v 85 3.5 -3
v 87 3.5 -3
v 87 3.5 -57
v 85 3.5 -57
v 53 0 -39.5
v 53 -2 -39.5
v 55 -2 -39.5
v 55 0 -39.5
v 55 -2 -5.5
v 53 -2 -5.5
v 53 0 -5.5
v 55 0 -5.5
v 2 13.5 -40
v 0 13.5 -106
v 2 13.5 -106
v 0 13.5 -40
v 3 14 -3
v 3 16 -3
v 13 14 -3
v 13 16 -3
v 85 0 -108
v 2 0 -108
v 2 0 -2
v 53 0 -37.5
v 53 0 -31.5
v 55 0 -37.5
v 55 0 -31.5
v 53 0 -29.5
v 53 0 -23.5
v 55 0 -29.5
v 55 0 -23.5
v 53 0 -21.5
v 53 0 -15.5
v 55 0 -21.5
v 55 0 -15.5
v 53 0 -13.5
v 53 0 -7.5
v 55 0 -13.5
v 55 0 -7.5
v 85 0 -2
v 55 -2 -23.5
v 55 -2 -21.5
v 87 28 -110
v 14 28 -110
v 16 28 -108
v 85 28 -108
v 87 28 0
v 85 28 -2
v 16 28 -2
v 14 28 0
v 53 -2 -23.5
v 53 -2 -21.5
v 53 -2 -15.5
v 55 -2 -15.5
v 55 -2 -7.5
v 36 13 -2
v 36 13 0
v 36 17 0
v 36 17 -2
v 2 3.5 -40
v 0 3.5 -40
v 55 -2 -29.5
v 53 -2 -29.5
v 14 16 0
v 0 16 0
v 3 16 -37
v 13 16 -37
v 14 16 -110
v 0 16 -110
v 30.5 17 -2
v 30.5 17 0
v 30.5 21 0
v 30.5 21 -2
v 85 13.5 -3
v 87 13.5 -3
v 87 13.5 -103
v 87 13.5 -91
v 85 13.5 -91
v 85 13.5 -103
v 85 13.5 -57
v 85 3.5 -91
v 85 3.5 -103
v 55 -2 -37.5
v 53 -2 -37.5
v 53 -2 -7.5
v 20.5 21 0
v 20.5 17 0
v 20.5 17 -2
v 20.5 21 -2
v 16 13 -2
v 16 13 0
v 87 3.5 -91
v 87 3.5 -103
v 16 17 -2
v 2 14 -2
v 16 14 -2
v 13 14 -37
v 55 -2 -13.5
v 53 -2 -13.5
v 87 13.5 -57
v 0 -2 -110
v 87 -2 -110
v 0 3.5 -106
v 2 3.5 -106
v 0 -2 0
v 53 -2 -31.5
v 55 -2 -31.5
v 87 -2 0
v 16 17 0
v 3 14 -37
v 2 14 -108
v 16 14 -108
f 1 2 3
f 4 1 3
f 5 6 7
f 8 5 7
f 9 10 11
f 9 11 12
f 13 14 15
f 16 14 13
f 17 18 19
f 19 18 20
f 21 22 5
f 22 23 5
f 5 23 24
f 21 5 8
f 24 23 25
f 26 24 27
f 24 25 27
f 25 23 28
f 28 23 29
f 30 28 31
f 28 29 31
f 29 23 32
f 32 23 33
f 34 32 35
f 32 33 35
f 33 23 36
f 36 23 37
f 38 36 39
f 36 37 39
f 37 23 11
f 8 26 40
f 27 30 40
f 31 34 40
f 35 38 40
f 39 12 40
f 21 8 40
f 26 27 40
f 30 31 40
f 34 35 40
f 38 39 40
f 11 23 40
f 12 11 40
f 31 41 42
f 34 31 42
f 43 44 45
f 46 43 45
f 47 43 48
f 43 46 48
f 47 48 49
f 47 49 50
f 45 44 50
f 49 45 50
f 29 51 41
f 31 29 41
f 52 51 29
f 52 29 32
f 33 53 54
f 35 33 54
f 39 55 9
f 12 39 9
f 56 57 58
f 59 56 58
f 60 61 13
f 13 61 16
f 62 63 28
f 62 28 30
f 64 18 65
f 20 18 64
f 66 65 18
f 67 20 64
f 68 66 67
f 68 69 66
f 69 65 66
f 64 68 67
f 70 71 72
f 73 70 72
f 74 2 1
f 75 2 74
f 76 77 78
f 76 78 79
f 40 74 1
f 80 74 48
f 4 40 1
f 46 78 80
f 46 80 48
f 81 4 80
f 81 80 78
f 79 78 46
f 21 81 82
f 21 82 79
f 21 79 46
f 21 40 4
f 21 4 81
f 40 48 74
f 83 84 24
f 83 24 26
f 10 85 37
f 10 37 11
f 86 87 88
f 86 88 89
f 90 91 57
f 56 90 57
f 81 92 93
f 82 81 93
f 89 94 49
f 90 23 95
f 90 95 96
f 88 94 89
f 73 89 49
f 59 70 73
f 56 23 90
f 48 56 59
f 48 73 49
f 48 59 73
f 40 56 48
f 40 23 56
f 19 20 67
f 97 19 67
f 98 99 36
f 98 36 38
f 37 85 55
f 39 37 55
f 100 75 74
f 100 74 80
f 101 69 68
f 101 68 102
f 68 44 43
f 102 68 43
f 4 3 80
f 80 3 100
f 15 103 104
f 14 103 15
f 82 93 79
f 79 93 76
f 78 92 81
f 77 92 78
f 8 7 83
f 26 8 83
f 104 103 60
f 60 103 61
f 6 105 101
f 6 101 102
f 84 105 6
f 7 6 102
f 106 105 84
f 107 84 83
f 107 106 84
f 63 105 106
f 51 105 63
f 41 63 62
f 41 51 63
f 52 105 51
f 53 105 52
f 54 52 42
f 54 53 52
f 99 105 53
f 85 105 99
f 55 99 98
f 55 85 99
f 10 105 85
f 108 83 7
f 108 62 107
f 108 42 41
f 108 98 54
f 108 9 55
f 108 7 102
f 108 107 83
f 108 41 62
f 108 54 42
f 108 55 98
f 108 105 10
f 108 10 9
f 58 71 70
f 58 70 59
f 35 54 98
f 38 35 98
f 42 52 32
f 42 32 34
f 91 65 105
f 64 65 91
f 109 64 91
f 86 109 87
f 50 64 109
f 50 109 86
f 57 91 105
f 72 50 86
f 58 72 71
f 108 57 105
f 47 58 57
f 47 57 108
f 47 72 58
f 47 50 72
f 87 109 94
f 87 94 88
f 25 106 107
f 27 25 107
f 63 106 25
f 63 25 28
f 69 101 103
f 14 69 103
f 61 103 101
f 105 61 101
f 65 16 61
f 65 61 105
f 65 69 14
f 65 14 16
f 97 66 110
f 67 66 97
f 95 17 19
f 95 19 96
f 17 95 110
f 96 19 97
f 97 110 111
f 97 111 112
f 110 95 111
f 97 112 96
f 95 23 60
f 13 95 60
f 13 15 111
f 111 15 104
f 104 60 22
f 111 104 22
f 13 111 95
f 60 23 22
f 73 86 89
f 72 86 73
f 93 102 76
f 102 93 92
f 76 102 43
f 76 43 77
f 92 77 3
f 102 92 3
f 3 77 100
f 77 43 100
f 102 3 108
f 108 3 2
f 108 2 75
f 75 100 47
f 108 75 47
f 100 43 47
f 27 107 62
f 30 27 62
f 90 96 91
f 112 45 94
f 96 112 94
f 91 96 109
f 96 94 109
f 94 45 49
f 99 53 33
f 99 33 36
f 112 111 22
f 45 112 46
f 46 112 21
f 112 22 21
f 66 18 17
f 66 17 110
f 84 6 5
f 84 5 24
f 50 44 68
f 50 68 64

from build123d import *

# Parameters (mm, degrees)
IZIM2_W                      = 87
IZIM2_H                      = 110
Y_KSEKLIK_EKSTR_ZYON1_DEPTH  = 28
BO_ALTMA1_T                  = -2
IZIM3_W                      = 66
IZIM3_H                      = 10
KES_EKSTR_ZYON1_DEPTH        = 2
IZIM4_W                      = 14
IZIM4_H                      = 14
KES_EKSTR_ZYON3_DEPTH        = 110
IZIM5_W                      = 16
IZIM5_H                      = 110
Y_KSEKLIK_EKSTR_ZYON2_DEPTH  = 2
IZIM7_W                      = 10
IZIM7_H                      = 34
KES_EKSTR_ZYON4_DEPTH        = 1
IZIM8_W                      = 10
IZIM8_H                      = 4
IZIM8_W_2                    = 20
KES_EKSTR_ZYON5_DEPTH        = 2
IZIM9_W                      = 54
IZIM9_H                      = 10
KES_EKSTR_ZYON6_DEPTH        = 2
IZIM10_W                     = 87
IZIM10_H                     = 110
Y_KSEKLIK_EKSTR_ZYON4_DEPTH  = 2
IZIM11_W                     = 12
IZIM11_H                     = 10
KES_EKSTR_ZYON7_DEPTH        = 2
IZIM12_W                     = 2
IZIM12_H                     = 2
KES_EKSTR_ZYON8_DEPTH        = 2
IZIM14_W                     = 10
IZIM14_H                     = 34
KES_EKSTR_ZYON9_DEPTH        = 2
IZIM15_W                     = 106
IZIM15_H                     = 12
Y_KSEKLIK_EKSTR_ZYON15_DEPTH = 2


with BuildPart() as part:
    # Çizim2 → Yükseklik-Ekstrüzyon1 (new body)
    with BuildSketch(Plane(origin=(0, 0, 0), x_dir=(1, 0, 0), z_dir=(0, 1, 0))):
        with Locations((43.5, 55)):
            Rectangle(IZIM2_W, IZIM2_H)
    extrude(amount=Y_KSEKLIK_EKSTR_ZYON1_DEPTH)

    # İç Boşaltma1
    bo_altma1_openings = [part.faces().sort_by_distance(p)[0] for p in [
        (43.5, 28, -55),
        (43.5, 0, -55),
    ]]
    offset(amount=BO_ALTMA1_T, openings=bo_altma1_openings, kind=Kind.INTERSECTION)

    # Çizim3 → Kes-Ekstrüzyon1 (cut)
    with BuildSketch(Plane.ZY):
        with Locations((-73, 8.5)):
            Rectangle(IZIM3_W, IZIM3_H)
    extrude(amount=-KES_EKSTR_ZYON1_DEPTH, mode=Mode.SUBTRACT)

    # Çizim4 → Kes-Ekstrüzyon3 (cut)
    with BuildSketch(Plane(origin=(0, 0, -110), x_dir=(-1, 0, 0), z_dir=(0, 0, -1))):
        with Locations((-7, 21)):
            Rectangle(IZIM4_W, IZIM4_H)
    extrude(amount=-KES_EKSTR_ZYON3_DEPTH, mode=Mode.SUBTRACT)

    # Çizim5 → Yükseklik-Ekstrüzyon2 (add)
    with BuildSketch(Plane(origin=(0, 14, 0), x_dir=(1, 0, 0), z_dir=(0, 1, 0))):
        with Locations((8, 55)):
            Rectangle(IZIM5_W, IZIM5_H)
    extrude(amount=Y_KSEKLIK_EKSTR_ZYON2_DEPTH)

    # Çizim7 → Kes-Ekstrüzyon4 (cut)
    with BuildSketch(Plane(origin=(0, 16, 0), x_dir=(1, 0, 0), z_dir=(0, 1, 0))):
        with Locations((8, 20)):
            Rectangle(IZIM7_W, IZIM7_H)
    extrude(amount=-KES_EKSTR_ZYON4_DEPTH, mode=Mode.SUBTRACT)

    # Çizim8 → Kes-Ekstrüzyon5 (cut)
    with BuildSketch(Plane.XY):
        with Locations((25.500000105, 19)):
            Rectangle(IZIM8_W, IZIM8_H)
        with Locations((26, 15)):
            Rectangle(IZIM8_W_2, IZIM8_H)
    extrude(amount=-KES_EKSTR_ZYON5_DEPTH, mode=Mode.SUBTRACT)

    # Çizim9 → Kes-Ekstrüzyon6 (cut)
    with BuildSketch(Plane(origin=(87, 0, 0), x_dir=(0, 0, -1), z_dir=(1, 0, 0))):
        with Locations((30, 8.5)):
            Rectangle(IZIM9_W, IZIM9_H)
    extrude(amount=-KES_EKSTR_ZYON6_DEPTH, mode=Mode.SUBTRACT)

    # Çizim10 → Yükseklik-Ekstrüzyon4 (add)
    with BuildSketch(Plane.XZ):
        with Locations((43.5, -55)):
            Rectangle(IZIM10_W, IZIM10_H)
    extrude(amount=Y_KSEKLIK_EKSTR_ZYON4_DEPTH)

    # Çizim11 → Kes-Ekstrüzyon7 (cut)
    with BuildSketch(Plane(origin=(87, 0, 0), x_dir=(0, 0, -1), z_dir=(1, 0, 0))):
        with Locations((97, 8.5)):
            Rectangle(IZIM11_W, IZIM11_H)
    extrude(amount=-KES_EKSTR_ZYON7_DEPTH, mode=Mode.SUBTRACT)

    # Çizim12 → Kes-Ekstrüzyon8 (cut)
    with BuildSketch(Plane.XZ.offset(2)):
        with Locations((54, -6.5)):
            Rectangle(IZIM12_W, IZIM12_H)
        with Locations((54, -38.5)):
            Rectangle(IZIM12_W, IZIM12_H)
        with Locations((54, -22.5)):
            Rectangle(IZIM12_W, IZIM12_H)
        with Locations((54, -14.5)):
            Rectangle(IZIM12_W, IZIM12_H)
        with Locations((54, -30.5)):
            Rectangle(IZIM12_W, IZIM12_H)
    extrude(amount=-KES_EKSTR_ZYON8_DEPTH, mode=Mode.SUBTRACT)

    # Çizim14 → Kes-Ekstrüzyon9 (cut)
    with BuildSketch(Plane(origin=(0, 15, 0), x_dir=(1, 0, 0), z_dir=(0, 1, 0))):
        with Locations((8, 20)):
            Rectangle(IZIM14_W, IZIM14_H)
    extrude(amount=-KES_EKSTR_ZYON9_DEPTH, mode=Mode.SUBTRACT)

    # Çizim15 → Yükseklik-Ekstrüzyon15 (add)
    with BuildSketch(Plane.ZY.offset(-14)):
        with Locations((-55, 22)):
            Rectangle(IZIM15_W, IZIM15_H)
    extrude(amount=-Y_KSEKLIK_EKSTR_ZYON15_DEPTH)


solid = part.part
